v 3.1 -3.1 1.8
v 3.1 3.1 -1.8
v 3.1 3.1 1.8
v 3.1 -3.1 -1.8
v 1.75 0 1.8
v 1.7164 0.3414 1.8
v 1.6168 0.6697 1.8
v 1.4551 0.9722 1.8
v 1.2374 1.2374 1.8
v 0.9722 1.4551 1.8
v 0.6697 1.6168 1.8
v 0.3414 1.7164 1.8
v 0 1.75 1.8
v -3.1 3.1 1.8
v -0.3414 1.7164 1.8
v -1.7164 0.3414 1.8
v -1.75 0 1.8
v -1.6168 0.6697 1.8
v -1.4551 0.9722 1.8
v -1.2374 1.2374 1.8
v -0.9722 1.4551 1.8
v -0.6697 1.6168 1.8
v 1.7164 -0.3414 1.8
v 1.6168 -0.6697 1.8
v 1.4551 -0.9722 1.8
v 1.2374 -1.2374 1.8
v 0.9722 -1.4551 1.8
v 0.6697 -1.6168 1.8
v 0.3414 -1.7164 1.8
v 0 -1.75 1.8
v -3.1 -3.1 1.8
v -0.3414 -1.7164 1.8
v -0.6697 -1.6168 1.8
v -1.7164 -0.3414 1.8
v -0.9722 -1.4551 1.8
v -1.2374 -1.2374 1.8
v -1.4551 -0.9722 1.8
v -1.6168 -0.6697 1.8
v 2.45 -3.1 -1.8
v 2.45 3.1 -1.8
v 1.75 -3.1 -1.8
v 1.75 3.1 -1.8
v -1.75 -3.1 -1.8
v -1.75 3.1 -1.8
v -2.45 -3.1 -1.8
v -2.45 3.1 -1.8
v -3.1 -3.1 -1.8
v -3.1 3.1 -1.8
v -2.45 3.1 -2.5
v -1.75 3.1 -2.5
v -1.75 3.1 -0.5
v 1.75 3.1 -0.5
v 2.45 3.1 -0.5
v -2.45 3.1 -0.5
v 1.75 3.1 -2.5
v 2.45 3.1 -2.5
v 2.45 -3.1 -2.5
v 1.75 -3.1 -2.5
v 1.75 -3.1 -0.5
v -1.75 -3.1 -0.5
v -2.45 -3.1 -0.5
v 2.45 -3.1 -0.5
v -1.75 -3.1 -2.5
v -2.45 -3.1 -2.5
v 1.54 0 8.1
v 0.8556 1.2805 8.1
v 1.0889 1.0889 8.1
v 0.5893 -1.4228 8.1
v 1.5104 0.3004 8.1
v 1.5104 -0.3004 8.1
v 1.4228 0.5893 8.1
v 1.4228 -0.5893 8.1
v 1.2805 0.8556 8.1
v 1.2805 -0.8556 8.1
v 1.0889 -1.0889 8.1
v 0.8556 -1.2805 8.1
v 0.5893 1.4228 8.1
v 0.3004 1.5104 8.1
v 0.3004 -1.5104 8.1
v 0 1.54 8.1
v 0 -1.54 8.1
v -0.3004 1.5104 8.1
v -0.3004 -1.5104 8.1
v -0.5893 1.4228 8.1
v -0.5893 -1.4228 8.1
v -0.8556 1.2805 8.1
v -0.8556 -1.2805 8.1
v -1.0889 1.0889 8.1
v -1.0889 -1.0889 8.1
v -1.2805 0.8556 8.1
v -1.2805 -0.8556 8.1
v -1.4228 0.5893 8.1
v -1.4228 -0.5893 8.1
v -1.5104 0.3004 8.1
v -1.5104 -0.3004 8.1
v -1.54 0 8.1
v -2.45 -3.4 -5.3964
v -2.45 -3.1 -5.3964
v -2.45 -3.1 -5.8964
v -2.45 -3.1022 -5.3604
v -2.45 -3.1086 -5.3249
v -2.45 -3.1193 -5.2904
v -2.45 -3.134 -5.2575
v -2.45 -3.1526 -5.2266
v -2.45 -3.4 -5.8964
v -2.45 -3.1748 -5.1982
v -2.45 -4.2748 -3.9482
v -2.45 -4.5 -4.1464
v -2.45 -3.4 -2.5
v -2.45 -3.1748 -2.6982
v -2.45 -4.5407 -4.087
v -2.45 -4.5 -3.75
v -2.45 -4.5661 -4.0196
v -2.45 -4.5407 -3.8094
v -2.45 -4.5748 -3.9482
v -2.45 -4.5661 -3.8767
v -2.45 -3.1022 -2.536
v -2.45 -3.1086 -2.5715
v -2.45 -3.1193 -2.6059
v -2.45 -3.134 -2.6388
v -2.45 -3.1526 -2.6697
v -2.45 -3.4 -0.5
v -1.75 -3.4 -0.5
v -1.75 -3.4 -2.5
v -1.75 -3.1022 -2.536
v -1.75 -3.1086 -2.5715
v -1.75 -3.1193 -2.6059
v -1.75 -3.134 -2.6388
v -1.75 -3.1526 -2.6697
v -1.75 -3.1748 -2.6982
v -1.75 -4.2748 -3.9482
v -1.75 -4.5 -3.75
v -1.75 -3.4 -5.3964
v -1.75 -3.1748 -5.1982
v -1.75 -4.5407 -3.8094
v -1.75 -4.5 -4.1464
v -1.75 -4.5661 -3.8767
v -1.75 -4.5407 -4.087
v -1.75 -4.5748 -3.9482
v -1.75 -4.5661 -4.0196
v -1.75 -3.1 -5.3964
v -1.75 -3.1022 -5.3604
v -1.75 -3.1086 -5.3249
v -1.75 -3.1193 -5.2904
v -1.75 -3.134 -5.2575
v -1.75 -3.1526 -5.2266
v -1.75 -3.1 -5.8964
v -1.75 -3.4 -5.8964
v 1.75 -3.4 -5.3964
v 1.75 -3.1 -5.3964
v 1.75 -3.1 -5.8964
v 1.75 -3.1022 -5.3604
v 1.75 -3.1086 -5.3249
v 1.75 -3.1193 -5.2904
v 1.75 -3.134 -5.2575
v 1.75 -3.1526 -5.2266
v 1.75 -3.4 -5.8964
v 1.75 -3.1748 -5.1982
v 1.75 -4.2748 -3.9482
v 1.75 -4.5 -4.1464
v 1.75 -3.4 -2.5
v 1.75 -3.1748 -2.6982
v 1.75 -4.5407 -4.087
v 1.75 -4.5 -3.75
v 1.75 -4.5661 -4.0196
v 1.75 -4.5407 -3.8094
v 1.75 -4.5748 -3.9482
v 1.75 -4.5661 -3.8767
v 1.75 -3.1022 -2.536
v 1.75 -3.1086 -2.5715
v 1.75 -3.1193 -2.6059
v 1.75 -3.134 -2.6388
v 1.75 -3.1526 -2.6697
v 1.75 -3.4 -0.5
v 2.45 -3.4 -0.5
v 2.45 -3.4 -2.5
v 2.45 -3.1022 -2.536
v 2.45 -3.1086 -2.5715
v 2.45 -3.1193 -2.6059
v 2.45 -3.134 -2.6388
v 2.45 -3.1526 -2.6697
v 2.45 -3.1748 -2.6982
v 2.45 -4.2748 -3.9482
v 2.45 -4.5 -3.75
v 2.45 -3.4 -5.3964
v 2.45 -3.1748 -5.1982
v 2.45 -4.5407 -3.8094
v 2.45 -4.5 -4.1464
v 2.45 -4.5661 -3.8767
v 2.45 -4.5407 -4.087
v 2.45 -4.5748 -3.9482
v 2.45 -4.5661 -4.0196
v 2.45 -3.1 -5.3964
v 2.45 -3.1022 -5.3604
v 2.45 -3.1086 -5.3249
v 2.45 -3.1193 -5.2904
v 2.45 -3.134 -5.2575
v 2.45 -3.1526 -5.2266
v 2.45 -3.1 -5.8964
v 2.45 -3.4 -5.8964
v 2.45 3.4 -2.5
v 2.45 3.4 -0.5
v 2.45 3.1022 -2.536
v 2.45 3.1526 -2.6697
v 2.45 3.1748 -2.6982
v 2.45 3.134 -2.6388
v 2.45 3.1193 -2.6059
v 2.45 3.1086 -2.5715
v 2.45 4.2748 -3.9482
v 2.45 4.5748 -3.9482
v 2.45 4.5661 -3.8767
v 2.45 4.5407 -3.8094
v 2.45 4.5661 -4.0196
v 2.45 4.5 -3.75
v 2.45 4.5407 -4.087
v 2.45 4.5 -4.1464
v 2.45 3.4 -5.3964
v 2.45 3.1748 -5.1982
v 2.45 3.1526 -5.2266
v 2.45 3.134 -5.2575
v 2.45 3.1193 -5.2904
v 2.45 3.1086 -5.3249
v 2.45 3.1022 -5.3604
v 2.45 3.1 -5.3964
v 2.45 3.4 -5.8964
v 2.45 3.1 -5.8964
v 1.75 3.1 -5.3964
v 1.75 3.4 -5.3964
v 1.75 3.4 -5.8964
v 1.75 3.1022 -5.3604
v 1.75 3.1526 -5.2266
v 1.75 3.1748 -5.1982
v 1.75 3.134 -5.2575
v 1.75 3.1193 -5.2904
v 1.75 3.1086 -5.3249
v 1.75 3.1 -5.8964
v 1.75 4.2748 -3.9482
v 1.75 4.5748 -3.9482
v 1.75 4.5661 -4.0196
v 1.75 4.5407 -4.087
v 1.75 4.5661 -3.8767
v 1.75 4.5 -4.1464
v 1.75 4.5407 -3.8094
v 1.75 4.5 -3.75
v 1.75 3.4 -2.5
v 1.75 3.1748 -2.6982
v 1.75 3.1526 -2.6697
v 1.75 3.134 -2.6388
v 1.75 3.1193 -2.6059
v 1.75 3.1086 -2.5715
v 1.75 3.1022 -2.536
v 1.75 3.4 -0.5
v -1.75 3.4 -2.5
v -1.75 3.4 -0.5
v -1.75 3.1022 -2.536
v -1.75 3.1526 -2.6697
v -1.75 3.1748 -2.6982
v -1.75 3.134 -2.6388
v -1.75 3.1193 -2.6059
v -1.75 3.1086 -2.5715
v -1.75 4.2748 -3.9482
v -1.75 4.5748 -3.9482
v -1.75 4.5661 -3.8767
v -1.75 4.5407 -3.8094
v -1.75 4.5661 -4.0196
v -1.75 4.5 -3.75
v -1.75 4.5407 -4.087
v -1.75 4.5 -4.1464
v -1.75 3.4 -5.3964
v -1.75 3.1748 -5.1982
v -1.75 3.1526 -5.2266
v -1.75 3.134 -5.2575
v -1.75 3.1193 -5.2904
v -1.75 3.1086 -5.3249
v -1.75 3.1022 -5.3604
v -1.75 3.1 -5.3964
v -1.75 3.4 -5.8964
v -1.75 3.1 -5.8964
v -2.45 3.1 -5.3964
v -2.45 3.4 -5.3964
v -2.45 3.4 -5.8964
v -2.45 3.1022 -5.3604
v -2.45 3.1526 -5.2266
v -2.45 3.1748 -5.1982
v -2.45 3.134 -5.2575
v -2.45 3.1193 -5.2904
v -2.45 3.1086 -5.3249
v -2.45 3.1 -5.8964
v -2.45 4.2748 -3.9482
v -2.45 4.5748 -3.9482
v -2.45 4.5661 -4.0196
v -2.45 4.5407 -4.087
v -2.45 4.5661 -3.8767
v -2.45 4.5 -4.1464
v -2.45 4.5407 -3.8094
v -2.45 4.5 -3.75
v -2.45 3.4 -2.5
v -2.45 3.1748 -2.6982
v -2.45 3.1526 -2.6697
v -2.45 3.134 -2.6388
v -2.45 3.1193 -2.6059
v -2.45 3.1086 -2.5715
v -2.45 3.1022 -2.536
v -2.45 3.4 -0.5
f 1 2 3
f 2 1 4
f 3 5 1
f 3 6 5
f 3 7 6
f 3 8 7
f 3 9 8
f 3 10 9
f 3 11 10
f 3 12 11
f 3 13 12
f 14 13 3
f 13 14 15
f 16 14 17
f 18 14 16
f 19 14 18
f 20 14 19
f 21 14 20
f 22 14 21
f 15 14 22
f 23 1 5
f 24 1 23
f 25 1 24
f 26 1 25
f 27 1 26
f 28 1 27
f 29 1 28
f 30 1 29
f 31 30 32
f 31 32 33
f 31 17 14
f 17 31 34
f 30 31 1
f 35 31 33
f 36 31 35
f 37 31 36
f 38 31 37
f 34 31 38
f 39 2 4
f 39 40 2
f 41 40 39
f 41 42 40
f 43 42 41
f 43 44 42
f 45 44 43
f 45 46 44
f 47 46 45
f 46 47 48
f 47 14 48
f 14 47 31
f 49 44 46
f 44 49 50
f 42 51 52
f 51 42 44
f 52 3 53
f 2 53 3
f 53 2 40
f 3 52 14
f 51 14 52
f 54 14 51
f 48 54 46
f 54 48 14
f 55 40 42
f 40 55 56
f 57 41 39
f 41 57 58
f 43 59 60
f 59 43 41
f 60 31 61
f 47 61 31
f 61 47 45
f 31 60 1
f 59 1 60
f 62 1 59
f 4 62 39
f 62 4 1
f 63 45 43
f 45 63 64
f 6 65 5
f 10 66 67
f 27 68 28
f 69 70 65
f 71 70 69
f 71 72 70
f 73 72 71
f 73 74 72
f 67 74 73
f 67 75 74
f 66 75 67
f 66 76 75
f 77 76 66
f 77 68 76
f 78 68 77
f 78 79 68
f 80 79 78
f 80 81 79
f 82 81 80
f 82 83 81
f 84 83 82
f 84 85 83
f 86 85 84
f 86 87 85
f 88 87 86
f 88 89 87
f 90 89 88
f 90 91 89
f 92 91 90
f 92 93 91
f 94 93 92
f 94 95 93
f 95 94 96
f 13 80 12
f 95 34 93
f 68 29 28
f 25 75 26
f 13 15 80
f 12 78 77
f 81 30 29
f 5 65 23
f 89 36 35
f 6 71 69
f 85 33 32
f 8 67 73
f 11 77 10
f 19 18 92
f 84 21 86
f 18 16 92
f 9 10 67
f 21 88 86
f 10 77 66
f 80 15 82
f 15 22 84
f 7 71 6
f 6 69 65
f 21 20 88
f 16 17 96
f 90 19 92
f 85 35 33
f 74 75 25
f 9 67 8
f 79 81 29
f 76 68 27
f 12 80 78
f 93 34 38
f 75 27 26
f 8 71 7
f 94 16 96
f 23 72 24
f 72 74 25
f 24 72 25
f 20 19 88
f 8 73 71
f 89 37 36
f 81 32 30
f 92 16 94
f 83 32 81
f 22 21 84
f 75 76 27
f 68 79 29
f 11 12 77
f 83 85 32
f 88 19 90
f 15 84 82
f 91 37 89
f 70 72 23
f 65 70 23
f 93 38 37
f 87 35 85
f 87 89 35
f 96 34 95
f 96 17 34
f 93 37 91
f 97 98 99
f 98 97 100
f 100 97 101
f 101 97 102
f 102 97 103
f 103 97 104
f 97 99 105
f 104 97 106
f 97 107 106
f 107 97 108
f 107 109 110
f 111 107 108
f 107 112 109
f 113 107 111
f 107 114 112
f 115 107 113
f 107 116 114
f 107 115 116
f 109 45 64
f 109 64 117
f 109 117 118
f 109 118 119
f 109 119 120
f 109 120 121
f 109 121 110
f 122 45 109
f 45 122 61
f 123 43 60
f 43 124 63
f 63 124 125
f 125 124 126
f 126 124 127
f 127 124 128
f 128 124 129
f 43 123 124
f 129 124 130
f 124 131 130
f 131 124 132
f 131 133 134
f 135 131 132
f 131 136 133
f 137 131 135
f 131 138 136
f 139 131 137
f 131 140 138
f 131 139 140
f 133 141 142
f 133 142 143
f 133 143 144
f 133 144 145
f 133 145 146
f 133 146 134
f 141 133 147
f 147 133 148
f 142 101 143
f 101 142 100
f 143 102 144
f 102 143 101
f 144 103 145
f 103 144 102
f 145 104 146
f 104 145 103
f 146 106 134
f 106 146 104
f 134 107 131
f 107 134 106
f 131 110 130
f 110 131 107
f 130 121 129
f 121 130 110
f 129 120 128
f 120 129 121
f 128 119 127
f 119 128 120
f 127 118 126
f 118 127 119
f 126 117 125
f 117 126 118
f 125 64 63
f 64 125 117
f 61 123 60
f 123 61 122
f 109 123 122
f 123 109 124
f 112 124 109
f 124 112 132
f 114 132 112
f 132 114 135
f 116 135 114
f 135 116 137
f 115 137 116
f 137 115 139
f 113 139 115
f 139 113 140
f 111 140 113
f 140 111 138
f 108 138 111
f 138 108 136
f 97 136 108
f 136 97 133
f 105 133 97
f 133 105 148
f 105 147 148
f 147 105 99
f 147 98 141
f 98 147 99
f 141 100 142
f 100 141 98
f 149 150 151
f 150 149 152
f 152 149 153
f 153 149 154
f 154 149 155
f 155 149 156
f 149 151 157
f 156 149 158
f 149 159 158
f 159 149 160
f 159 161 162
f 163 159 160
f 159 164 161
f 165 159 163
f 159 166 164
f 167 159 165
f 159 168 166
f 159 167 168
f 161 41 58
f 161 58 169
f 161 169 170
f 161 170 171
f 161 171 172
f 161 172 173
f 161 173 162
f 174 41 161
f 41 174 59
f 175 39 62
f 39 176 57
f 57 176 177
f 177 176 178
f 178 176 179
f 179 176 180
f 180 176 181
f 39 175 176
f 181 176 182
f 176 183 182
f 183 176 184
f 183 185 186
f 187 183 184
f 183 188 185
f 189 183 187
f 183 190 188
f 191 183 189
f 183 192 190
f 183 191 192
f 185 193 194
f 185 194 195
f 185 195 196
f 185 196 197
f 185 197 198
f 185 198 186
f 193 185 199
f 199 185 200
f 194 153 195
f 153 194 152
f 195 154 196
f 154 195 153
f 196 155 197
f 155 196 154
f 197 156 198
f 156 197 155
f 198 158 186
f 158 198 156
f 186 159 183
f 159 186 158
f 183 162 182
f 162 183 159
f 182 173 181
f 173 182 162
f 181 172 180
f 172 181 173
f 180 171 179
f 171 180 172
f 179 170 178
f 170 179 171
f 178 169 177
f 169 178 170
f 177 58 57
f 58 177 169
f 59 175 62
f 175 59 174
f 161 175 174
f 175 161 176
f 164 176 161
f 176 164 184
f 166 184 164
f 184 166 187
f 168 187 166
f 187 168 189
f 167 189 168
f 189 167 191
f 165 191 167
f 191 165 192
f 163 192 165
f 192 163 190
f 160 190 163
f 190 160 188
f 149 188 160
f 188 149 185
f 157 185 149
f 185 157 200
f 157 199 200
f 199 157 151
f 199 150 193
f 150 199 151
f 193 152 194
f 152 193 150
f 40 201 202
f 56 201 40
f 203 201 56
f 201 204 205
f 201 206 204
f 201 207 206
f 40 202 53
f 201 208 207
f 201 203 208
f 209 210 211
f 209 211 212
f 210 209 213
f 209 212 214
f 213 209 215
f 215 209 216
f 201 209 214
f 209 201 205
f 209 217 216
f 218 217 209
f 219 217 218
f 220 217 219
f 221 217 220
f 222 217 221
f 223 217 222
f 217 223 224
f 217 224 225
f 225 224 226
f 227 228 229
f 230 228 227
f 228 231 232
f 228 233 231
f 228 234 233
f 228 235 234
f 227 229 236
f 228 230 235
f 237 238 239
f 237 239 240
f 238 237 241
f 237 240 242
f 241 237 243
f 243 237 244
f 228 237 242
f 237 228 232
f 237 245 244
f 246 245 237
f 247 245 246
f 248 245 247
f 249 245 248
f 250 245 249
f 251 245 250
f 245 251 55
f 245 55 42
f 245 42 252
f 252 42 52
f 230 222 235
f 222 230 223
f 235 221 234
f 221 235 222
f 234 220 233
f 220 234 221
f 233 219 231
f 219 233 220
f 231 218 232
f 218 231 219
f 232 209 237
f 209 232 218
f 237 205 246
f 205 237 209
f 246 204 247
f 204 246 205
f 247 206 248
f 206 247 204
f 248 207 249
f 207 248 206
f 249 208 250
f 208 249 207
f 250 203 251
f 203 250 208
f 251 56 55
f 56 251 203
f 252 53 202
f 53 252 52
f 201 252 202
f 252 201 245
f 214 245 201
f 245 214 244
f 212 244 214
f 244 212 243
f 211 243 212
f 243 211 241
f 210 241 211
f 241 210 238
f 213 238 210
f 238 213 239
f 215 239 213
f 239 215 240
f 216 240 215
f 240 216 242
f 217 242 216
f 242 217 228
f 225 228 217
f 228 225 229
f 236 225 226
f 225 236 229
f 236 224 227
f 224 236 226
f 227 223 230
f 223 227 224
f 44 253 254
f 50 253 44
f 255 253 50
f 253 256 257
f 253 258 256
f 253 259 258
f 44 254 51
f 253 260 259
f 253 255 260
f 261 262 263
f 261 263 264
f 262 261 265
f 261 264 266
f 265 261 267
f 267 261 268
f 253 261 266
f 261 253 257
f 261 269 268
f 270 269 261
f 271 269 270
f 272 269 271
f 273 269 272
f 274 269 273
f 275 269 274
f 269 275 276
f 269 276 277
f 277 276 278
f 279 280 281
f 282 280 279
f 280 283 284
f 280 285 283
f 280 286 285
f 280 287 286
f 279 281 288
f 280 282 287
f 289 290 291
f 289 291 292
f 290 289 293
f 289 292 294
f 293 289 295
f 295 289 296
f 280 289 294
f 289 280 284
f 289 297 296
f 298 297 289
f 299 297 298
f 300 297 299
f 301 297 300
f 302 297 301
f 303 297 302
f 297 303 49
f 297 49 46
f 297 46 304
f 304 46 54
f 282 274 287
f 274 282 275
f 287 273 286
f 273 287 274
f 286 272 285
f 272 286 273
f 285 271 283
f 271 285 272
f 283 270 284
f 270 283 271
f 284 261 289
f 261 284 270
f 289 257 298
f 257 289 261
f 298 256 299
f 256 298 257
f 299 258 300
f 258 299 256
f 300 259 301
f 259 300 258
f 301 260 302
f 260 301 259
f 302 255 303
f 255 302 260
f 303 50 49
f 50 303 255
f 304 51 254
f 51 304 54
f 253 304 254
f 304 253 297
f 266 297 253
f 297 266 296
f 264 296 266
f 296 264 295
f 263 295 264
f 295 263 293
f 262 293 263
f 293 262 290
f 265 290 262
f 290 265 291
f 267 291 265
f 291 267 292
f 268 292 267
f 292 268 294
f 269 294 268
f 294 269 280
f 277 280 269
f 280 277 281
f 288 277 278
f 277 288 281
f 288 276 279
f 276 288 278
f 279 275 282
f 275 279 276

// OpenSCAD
// Start: lazy_union
default_5_default_5();
// End: lazy_union

// Modules.

// 'PartMaterial undef-default - default 5.0'
module default_5_default_5() {
  // 'None : _combine_solids_and_holes'
  union() {
    // 'default : _combine_solids_and_holes'
    union() {
      // 'body'
      multmatrix(m=[[1.0, 0.0, 0.0, -3.1], [0.0, 1.0, 0.0, -3.1], [0.0, 0.0, 1.0, -1.8], [0.0, 0.0, 0.0, 1.0]]) {
        // 'body : _combine_solids_and_holes'
        union() {
          // 'body'
          cube(size=[6.2, 6.2, 3.6]);
        }
      }
      // 'shaft'
      multmatrix(m=[[1.0, 0.0, 0.0, 0.0], [0.0, 1.0, 0.0, 0.0], [0.0, 0.0, 1.0, 1.8], [0.0, 0.0, 0.0, 1.0]]) {
        // 'shaft : _combine_solids_and_holes'
        union() {
          // 'shaft'
          cylinder(h=6.3, r1=1.75, r2=1.54, center=false, $fn=32);
        }
      }
      // ('lead', 3)
      multmatrix(m=[[0.0, 0.0, 1.0, -2.45], [0.0, -1.0, 0.0, -3.1], [1.0, 0.0, 0.0, -1.8], [0.0, 0.0, 0.0, 1.0]]) {
        // "('lead', 3) : _combine_solids_and_holes"
        union() {
          // 'terminal : _combine_solids_and_holes'
          union() {
            // 'terminal'
            linear_extrude(height=0.7, twist=0.0, slices=4, scale=[1.0, 1.0], $fn=32) {
              polygon(points=[[0.0, 0.0], [-0.7, 0.0], [-0.7359958083311317, 0.00216732586469226], [-0.7714715190194863, 0.008637988116077133], [-0.8059145492294425, 0.019318493196427367], [-0.8388272371594507, 0.03405452020635208], [-0.8697340326773294, 0.05263315066264182], [-0.8981883684676073, 0.07478594492317342], [-2.1481883684676077, 1.174785944923174], [-3.3981883684676086, 0.07478594492317447], [-3.426642704257887, 0.0526331506626429], [-3.457549499775765, 0.034054520206353245], [-3.4904621877057735, 0.019318493196428588], [-3.5249052179157294, 0.00863798811607841], [-3.560380928604084, 0.0021673258646935367], [-3.5963767369352158, 1.27675647831893e-15], [-4.096376736935216, 1.1906291571089884e-15], [-4.096376736935216, 0.30000000000000115], [-3.596376736935216, 0.3000000000000012], [-2.3463767369352158, 1.400000000000001], [-2.287015605627059, 1.4407314247168224], [-2.219659887487095, 1.466147956807097], [-2.1481883684676086, 1.4747859449231742], [-2.0767168494481223, 1.466147956807097], [-2.009361131308158, 1.4407314247168221], [-1.950000000000001, 1.4000000000000008], [-0.7000000000000015, 0.2999999999999998], [1.2999999999999983, 0.29999999999999827], [1.299999999999998, 0.0]]);
            }
          }
        }
      }
      // ('lead', 1)
      multmatrix(m=[[0.0, 0.0, 1.0, 1.75], [0.0, -1.0, 0.0, -3.1], [1.0, 0.0, 0.0, -1.8], [0.0, 0.0, 0.0, 1.0]]) {
        // "('lead', 1) : _combine_solids_and_holes"
        union() {
          // 'terminal : _combine_solids_and_holes'
          union() {
            // 'terminal'
            linear_extrude(height=0.7, twist=0.0, slices=4, scale=[1.0, 1.0], $fn=32) {
              polygon(points=[[0.0, 0.0], [-0.7, 0.0], [-0.7359958083311317, 0.00216732586469226], [-0.7714715190194863, 0.008637988116077133], [-0.8059145492294425, 0.019318493196427367], [-0.8388272371594507, 0.03405452020635208], [-0.8697340326773294, 0.05263315066264182], [-0.8981883684676073, 0.07478594492317342], [-2.1481883684676077, 1.174785944923174], [-3.3981883684676086, 0.07478594492317447], [-3.426642704257887, 0.0526331506626429], [-3.457549499775765, 0.034054520206353245], [-3.4904621877057735, 0.019318493196428588], [-3.5249052179157294, 0.00863798811607841], [-3.560380928604084, 0.0021673258646935367], [-3.5963767369352158, 1.27675647831893e-15], [-4.096376736935216, 1.1906291571089884e-15], [-4.096376736935216, 0.30000000000000115], [-3.596376736935216, 0.3000000000000012], [-2.3463767369352158, 1.400000000000001], [-2.287015605627059, 1.4407314247168224], [-2.219659887487095, 1.466147956807097], [-2.1481883684676086, 1.4747859449231742], [-2.0767168494481223, 1.466147956807097], [-2.009361131308158, 1.4407314247168221], [-1.950000000000001, 1.4000000000000008], [-0.7000000000000015, 0.2999999999999998], [1.2999999999999983, 0.29999999999999827], [1.299999999999998, 0.0]]);
            }
          }
        }
      }
      // ('lead', 2)
      multmatrix(m=[[0.0, 0.0, -1.0, 2.45], [0.0, 1.0, 0.0, 3.1], [1.0, 0.0, 0.0, -1.8], [0.0, 0.0, 0.0, 1.0]]) {
        // "('lead', 2) : _combine_solids_and_holes"
        union() {
          // 'terminal : _combine_solids_and_holes'
          union() {
            // 'terminal'
            linear_extrude(height=0.7, twist=0.0, slices=4, scale=[1.0, 1.0], $fn=32) {
              polygon(points=[[0.0, 0.0], [-0.7, 0.0], [-0.7359958083311317, 0.00216732586469226], [-0.7714715190194863, 0.008637988116077133], [-0.8059145492294425, 0.019318493196427367], [-0.8388272371594507, 0.03405452020635208], [-0.8697340326773294, 0.05263315066264182], [-0.8981883684676073, 0.07478594492317342], [-2.1481883684676077, 1.174785944923174], [-3.3981883684676086, 0.07478594492317447], [-3.426642704257887, 0.0526331506626429], [-3.457549499775765, 0.034054520206353245], [-3.4904621877057735, 0.019318493196428588], [-3.5249052179157294, 0.00863798811607841], [-3.560380928604084, 0.0021673258646935367], [-3.5963767369352158, 1.27675647831893e-15], [-4.096376736935216, 1.1906291571089884e-15], [-4.096376736935216, 0.30000000000000115], [-3.596376736935216, 0.3000000000000012], [-2.3463767369352158, 1.400000000000001], [-2.287015605627059, 1.4407314247168224], [-2.219659887487095, 1.466147956807097], [-2.1481883684676086, 1.4747859449231742], [-2.0767168494481223, 1.466147956807097], [-2.009361131308158, 1.4407314247168221], [-1.950000000000001, 1.4000000000000008], [-0.7000000000000015, 0.2999999999999998], [1.2999999999999983, 0.29999999999999827], [1.299999999999998, 0.0]]);
            }
          }
        }
      }
      // ('lead', 4)
      multmatrix(m=[[0.0, 0.0, -1.0, -1.75], [0.0, 1.0, 0.0, 3.1], [1.0, 0.0, 0.0, -1.8], [0.0, 0.0, 0.0, 1.0]]) {
        // "('lead', 4) : _combine_solids_and_holes"
        union() {
          // 'terminal : _combine_solids_and_holes'
          union() {
            // 'terminal'
            linear_extrude(height=0.7, twist=0.0, slices=4, scale=[1.0, 1.0], $fn=32) {
              polygon(points=[[0.0, 0.0], [-0.7, 0.0], [-0.7359958083311317, 0.00216732586469226], [-0.7714715190194863, 0.008637988116077133], [-0.8059145492294425, 0.019318493196427367], [-0.8388272371594507, 0.03405452020635208], [-0.8697340326773294, 0.05263315066264182], [-0.8981883684676073, 0.07478594492317342], [-2.1481883684676077, 1.174785944923174], [-3.3981883684676086, 0.07478594492317447], [-3.426642704257887, 0.0526331506626429], [-3.457549499775765, 0.034054520206353245], [-3.4904621877057735, 0.019318493196428588], [-3.5249052179157294, 0.00863798811607841], [-3.560380928604084, 0.0021673258646935367], [-3.5963767369352158, 1.27675647831893e-15], [-4.096376736935216, 1.1906291571089884e-15], [-4.096376736935216, 0.30000000000000115], [-3.596376736935216, 0.3000000000000012], [-2.3463767369352158, 1.400000000000001], [-2.287015605627059, 1.4407314247168224], [-2.219659887487095, 1.466147956807097], [-2.1481883684676086, 1.4747859449231742], [-2.0767168494481223, 1.466147956807097], [-2.009361131308158, 1.4407314247168221], [-1.950000000000001, 1.4000000000000008], [-0.7000000000000015, 0.2999999999999998], [1.2999999999999983, 0.29999999999999827], [1.299999999999998, 0.0]]);
            }
          }
        }
      }
    }
  }
} // end module default_5_default_5
